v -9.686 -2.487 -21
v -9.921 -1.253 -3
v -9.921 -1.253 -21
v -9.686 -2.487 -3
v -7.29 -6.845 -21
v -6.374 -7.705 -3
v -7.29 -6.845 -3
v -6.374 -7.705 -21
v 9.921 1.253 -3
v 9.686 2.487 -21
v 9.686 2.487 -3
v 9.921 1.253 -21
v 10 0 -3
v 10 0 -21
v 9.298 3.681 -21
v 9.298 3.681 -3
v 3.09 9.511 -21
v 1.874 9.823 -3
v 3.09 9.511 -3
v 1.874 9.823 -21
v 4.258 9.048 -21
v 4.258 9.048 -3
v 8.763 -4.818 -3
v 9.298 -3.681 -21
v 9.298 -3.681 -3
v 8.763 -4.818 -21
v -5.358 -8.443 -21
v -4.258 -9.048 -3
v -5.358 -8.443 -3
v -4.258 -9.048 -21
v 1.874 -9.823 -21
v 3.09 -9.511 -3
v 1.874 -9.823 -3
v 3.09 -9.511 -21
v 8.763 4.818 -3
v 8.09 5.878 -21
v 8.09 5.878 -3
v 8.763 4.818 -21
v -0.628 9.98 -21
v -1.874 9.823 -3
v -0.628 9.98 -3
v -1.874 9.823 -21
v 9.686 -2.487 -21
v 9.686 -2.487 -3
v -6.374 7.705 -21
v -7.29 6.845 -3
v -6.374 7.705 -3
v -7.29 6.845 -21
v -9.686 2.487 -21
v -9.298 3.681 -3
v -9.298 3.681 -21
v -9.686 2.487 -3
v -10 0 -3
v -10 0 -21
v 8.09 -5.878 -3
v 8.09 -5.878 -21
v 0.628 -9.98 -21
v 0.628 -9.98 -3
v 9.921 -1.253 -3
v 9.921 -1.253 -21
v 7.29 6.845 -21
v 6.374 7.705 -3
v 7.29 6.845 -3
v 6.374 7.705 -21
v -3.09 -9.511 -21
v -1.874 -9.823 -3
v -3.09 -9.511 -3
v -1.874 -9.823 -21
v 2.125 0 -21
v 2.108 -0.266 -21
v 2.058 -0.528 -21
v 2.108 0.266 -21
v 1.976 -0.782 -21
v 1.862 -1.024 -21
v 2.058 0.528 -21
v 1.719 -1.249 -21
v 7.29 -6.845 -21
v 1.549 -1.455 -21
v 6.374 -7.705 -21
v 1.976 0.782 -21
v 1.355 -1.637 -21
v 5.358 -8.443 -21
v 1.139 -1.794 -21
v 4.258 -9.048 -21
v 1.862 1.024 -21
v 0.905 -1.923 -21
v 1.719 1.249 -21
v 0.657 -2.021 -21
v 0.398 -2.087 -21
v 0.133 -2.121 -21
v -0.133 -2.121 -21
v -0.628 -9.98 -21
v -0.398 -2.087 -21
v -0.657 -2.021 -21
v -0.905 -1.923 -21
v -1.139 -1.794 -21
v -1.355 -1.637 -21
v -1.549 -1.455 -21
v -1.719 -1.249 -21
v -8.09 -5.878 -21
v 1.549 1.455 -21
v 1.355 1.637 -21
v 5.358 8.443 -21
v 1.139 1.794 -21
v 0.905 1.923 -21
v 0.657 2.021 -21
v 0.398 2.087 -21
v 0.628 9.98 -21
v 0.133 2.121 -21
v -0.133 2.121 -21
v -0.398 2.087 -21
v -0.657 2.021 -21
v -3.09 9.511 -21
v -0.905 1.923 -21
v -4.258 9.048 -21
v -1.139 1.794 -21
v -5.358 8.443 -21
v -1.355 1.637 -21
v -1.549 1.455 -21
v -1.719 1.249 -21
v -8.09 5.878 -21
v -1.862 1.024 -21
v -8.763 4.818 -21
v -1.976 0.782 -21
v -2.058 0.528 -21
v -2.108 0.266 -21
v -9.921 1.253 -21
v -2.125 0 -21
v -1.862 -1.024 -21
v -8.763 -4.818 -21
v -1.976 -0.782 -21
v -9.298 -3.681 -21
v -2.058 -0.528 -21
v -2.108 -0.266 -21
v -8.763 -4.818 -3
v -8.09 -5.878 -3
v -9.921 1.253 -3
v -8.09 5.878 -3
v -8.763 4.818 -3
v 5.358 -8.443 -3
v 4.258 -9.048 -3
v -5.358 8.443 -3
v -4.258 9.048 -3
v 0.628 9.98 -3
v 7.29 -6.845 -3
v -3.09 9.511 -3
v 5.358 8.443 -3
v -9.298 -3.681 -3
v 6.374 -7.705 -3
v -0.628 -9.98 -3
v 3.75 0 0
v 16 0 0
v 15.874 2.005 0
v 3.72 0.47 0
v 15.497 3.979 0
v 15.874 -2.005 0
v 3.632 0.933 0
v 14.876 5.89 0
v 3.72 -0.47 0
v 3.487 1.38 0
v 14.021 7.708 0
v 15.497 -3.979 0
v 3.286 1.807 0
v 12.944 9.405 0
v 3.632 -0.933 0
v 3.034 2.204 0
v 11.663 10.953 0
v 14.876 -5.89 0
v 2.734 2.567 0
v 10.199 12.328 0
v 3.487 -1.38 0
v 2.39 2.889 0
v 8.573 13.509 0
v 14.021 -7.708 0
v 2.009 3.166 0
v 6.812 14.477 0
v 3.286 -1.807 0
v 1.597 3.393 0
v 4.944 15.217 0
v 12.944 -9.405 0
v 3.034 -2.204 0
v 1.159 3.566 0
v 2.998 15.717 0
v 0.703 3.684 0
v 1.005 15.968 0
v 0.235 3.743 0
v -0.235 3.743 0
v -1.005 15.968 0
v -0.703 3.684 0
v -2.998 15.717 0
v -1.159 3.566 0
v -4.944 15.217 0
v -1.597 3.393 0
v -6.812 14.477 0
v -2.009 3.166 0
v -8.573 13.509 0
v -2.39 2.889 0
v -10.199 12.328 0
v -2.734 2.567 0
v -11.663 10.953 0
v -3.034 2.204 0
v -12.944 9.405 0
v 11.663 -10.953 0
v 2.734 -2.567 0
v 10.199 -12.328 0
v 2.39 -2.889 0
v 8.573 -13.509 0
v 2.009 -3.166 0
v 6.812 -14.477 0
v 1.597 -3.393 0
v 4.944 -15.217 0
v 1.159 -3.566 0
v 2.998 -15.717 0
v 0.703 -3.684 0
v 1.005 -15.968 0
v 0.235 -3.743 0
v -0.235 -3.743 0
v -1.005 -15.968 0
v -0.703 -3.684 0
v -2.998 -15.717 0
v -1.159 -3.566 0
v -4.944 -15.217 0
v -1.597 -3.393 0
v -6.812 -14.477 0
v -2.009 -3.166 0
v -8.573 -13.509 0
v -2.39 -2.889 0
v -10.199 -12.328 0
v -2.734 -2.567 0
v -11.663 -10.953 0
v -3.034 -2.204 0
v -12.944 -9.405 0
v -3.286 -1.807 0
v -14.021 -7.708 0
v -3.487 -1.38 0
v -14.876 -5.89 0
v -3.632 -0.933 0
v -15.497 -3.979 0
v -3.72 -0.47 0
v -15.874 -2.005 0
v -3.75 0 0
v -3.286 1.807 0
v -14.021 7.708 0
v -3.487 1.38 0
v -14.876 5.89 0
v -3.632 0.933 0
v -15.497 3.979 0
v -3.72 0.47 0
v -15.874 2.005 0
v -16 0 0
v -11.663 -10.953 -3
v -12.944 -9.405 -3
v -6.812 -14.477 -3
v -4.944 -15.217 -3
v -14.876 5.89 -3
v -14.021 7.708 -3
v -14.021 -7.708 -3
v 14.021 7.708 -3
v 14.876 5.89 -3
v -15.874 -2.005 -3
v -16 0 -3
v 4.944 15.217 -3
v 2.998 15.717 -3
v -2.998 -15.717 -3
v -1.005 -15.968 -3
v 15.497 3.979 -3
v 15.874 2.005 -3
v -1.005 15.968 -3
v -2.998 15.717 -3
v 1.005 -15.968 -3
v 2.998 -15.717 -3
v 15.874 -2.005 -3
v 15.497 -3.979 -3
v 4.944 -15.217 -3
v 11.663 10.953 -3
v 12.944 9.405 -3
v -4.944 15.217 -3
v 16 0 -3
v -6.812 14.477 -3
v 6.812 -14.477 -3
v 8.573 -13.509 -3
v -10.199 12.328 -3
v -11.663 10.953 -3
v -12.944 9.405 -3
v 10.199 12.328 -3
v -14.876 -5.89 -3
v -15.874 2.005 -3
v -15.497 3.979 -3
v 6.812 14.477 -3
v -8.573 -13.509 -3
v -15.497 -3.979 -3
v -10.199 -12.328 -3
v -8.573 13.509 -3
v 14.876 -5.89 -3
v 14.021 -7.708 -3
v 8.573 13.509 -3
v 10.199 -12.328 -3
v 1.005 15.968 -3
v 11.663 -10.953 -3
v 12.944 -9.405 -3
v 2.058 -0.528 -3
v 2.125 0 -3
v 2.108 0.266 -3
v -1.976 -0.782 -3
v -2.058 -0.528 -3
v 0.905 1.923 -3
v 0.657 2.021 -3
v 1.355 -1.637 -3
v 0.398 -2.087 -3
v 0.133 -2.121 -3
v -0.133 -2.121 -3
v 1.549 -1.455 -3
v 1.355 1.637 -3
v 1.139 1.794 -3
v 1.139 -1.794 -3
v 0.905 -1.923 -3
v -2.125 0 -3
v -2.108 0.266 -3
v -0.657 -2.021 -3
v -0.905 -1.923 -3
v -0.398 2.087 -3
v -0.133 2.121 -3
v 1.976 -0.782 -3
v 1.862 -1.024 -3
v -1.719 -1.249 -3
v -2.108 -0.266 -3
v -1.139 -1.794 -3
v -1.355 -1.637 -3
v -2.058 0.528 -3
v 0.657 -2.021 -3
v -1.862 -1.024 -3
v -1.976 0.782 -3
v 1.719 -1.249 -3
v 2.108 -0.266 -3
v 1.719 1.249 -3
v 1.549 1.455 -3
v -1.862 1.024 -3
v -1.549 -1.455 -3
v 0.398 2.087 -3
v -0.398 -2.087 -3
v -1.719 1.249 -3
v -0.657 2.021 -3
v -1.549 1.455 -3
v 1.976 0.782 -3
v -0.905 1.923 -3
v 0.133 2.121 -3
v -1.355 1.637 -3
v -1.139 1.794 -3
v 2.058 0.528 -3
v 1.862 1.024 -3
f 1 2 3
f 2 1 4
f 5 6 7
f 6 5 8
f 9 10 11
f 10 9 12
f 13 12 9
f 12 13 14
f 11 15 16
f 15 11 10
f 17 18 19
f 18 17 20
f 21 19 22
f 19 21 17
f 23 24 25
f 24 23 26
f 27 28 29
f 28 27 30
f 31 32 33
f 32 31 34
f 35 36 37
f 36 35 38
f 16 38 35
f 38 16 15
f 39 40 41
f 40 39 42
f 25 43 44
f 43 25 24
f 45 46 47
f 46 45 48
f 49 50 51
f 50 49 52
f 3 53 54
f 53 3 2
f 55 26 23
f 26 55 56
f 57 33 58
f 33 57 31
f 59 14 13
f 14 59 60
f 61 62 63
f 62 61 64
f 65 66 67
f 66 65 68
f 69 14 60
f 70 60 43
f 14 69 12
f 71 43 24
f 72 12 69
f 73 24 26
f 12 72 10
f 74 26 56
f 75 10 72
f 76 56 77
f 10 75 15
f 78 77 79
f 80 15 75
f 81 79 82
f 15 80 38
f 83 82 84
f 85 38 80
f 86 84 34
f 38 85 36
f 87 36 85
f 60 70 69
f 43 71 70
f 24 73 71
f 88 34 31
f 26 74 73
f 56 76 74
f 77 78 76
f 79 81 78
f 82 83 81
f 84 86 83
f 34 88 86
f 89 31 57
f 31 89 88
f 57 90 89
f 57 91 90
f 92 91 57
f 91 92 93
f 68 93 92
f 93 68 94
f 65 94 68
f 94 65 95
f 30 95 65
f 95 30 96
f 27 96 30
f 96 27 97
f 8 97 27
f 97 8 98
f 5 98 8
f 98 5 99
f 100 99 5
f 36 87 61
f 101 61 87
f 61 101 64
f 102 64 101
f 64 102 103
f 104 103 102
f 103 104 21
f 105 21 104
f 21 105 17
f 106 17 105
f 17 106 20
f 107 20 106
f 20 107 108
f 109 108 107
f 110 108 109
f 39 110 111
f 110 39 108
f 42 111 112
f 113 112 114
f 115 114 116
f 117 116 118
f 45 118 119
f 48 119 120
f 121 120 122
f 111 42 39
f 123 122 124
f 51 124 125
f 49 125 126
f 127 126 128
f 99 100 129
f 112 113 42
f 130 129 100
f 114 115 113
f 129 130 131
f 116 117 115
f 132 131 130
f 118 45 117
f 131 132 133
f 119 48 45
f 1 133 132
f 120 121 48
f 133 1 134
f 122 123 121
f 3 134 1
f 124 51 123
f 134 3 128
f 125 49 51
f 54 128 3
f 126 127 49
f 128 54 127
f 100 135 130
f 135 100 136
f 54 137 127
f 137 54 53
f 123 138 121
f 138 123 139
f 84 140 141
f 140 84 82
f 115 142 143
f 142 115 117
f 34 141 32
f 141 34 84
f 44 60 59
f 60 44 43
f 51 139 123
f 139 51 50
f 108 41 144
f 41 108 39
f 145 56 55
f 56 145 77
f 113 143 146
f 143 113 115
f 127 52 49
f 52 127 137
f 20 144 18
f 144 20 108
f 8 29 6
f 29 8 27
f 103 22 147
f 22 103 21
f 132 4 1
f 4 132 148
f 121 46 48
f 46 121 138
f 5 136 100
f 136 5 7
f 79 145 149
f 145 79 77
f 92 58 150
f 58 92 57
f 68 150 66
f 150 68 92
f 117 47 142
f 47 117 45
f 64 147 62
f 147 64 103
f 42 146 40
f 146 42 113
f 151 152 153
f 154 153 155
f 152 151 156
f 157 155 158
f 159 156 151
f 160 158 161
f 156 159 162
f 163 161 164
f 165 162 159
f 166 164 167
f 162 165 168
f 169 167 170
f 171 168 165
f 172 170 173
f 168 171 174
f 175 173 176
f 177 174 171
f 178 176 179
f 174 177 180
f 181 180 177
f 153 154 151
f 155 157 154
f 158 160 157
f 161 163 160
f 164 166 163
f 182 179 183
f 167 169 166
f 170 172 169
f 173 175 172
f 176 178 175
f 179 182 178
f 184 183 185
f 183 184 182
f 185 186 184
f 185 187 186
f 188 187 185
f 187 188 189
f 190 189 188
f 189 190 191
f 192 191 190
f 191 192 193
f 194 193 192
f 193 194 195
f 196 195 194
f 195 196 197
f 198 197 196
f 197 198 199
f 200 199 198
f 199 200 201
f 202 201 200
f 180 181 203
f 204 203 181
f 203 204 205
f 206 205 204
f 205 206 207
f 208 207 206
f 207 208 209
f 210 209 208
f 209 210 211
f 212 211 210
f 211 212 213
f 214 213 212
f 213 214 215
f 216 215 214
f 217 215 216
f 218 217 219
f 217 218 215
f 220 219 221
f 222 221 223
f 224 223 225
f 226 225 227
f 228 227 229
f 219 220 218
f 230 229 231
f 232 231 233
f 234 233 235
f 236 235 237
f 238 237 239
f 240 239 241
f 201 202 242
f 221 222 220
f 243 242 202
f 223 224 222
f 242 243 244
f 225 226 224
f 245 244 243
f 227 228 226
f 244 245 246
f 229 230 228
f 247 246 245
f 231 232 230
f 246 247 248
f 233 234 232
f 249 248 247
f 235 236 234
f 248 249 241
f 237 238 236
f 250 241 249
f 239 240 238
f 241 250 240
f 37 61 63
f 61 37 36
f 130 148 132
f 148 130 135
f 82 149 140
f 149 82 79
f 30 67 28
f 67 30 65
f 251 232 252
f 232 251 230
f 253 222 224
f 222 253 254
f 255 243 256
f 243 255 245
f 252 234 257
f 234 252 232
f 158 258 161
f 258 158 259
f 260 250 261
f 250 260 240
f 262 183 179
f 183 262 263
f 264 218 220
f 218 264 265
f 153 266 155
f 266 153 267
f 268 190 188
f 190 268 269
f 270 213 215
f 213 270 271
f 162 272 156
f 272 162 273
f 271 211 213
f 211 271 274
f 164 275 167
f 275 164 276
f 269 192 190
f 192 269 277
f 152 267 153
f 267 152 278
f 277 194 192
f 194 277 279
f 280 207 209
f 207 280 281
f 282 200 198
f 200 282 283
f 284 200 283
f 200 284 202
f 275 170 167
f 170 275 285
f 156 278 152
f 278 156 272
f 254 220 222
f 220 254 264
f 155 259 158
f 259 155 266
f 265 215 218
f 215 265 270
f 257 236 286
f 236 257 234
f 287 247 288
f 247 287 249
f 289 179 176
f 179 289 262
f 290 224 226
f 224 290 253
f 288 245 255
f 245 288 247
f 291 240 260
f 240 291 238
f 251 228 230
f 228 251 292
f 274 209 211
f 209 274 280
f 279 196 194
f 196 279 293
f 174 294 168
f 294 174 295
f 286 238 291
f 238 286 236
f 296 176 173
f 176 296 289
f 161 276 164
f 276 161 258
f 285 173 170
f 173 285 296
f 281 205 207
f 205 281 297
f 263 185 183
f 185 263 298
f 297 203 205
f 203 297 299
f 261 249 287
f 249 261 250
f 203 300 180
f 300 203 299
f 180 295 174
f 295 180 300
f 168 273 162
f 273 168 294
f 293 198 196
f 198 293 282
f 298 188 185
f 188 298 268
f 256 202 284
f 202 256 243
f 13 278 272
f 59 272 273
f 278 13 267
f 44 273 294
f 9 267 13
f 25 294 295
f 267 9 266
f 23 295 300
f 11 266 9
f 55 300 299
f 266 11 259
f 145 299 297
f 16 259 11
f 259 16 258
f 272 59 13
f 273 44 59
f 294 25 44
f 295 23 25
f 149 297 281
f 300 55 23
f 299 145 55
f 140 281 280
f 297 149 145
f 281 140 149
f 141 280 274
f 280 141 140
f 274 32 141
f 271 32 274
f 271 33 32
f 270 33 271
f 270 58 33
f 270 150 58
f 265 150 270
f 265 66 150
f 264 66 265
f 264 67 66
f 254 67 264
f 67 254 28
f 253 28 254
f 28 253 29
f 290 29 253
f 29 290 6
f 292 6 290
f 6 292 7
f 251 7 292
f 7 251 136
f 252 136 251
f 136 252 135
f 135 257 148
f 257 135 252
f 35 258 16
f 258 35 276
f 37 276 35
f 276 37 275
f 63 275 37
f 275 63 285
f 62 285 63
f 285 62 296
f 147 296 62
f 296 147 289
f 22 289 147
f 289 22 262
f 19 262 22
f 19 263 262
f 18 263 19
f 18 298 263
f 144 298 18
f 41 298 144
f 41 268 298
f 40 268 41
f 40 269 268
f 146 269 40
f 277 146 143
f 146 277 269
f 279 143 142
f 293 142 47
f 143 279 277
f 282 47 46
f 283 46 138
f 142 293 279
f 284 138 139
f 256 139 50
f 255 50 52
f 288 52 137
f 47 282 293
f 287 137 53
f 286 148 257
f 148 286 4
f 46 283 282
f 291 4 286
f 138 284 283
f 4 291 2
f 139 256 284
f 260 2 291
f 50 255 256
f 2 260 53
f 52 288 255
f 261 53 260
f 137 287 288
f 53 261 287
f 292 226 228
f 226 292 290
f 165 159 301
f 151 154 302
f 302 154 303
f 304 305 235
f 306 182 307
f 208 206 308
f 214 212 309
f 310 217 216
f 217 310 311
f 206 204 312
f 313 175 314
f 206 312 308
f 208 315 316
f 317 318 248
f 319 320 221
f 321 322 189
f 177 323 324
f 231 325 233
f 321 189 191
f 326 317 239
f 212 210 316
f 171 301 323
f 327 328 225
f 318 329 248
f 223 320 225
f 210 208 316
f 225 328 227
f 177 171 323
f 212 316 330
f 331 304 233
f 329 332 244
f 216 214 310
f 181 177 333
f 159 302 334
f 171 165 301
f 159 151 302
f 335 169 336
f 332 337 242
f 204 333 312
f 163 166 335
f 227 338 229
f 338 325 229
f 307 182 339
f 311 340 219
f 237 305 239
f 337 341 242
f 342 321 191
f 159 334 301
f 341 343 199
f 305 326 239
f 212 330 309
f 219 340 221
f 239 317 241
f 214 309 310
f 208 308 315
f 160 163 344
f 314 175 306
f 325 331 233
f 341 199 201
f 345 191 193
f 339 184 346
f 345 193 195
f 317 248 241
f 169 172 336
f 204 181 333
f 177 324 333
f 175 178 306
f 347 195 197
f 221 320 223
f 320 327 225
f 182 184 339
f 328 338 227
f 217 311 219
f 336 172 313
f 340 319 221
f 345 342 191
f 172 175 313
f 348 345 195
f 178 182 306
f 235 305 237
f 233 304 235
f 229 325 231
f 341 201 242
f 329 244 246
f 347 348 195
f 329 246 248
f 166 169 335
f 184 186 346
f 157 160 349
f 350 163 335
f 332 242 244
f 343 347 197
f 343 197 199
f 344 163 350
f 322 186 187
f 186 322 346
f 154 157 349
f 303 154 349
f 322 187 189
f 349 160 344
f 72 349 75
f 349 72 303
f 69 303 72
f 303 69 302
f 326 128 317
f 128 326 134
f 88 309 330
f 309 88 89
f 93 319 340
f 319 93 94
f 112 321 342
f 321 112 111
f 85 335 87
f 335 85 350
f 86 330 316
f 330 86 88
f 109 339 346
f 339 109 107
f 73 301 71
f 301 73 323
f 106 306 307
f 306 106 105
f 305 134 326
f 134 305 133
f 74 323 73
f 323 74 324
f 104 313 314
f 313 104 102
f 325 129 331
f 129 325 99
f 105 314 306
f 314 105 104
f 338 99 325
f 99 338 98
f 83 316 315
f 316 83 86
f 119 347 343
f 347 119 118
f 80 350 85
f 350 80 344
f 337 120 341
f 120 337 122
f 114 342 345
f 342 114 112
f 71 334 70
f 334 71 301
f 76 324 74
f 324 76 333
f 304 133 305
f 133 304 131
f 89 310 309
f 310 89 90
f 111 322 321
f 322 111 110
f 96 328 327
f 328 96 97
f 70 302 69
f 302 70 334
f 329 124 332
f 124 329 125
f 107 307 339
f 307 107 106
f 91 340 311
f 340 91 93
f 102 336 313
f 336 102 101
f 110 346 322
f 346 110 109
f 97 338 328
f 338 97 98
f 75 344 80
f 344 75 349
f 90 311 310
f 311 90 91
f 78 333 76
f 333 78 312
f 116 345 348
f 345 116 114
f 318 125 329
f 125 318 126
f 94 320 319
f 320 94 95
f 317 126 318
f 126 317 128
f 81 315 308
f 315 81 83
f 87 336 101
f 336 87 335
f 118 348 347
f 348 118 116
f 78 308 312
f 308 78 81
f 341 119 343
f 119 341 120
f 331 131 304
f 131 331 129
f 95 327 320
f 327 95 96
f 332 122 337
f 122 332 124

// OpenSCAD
$fn = 50;


difference() {
	union() {
		translate(v = [0, 0, -21.0000000000]) {
			cylinder(h = 21, r = 10.0000000000);
		}
		translate(v = [0, 0, -3.0000000000]) {
			cylinder(h = 3, r = 16.0000000000);
		}
	}
	union() {
		translate(v = [0, 0, 0]) {
			rotate(a = [0, 0, 0]) {
				difference() {
					union() {
						#translate(v = [0, 0, -21.0000000000]) {
							cylinder(h = 21, r = 2.0000000000);
						}
						#translate(v = [0, 0, -3]) {
							cylinder(h = 3, r = 10.0000000000, r1 = 2.1250000000, r2 = 3.7500000000);
						}
						#translate(v = [0, 0, -21.0000000000]) {
							cylinder(h = 21, r = 2.1250000000);
						}
						#translate(v = [0, 0, -21.0000000000]) {
							cylinder(h = 21, r = 2.0000000000);
						}
					}
					union();
				}
			}
		}
	}
}
